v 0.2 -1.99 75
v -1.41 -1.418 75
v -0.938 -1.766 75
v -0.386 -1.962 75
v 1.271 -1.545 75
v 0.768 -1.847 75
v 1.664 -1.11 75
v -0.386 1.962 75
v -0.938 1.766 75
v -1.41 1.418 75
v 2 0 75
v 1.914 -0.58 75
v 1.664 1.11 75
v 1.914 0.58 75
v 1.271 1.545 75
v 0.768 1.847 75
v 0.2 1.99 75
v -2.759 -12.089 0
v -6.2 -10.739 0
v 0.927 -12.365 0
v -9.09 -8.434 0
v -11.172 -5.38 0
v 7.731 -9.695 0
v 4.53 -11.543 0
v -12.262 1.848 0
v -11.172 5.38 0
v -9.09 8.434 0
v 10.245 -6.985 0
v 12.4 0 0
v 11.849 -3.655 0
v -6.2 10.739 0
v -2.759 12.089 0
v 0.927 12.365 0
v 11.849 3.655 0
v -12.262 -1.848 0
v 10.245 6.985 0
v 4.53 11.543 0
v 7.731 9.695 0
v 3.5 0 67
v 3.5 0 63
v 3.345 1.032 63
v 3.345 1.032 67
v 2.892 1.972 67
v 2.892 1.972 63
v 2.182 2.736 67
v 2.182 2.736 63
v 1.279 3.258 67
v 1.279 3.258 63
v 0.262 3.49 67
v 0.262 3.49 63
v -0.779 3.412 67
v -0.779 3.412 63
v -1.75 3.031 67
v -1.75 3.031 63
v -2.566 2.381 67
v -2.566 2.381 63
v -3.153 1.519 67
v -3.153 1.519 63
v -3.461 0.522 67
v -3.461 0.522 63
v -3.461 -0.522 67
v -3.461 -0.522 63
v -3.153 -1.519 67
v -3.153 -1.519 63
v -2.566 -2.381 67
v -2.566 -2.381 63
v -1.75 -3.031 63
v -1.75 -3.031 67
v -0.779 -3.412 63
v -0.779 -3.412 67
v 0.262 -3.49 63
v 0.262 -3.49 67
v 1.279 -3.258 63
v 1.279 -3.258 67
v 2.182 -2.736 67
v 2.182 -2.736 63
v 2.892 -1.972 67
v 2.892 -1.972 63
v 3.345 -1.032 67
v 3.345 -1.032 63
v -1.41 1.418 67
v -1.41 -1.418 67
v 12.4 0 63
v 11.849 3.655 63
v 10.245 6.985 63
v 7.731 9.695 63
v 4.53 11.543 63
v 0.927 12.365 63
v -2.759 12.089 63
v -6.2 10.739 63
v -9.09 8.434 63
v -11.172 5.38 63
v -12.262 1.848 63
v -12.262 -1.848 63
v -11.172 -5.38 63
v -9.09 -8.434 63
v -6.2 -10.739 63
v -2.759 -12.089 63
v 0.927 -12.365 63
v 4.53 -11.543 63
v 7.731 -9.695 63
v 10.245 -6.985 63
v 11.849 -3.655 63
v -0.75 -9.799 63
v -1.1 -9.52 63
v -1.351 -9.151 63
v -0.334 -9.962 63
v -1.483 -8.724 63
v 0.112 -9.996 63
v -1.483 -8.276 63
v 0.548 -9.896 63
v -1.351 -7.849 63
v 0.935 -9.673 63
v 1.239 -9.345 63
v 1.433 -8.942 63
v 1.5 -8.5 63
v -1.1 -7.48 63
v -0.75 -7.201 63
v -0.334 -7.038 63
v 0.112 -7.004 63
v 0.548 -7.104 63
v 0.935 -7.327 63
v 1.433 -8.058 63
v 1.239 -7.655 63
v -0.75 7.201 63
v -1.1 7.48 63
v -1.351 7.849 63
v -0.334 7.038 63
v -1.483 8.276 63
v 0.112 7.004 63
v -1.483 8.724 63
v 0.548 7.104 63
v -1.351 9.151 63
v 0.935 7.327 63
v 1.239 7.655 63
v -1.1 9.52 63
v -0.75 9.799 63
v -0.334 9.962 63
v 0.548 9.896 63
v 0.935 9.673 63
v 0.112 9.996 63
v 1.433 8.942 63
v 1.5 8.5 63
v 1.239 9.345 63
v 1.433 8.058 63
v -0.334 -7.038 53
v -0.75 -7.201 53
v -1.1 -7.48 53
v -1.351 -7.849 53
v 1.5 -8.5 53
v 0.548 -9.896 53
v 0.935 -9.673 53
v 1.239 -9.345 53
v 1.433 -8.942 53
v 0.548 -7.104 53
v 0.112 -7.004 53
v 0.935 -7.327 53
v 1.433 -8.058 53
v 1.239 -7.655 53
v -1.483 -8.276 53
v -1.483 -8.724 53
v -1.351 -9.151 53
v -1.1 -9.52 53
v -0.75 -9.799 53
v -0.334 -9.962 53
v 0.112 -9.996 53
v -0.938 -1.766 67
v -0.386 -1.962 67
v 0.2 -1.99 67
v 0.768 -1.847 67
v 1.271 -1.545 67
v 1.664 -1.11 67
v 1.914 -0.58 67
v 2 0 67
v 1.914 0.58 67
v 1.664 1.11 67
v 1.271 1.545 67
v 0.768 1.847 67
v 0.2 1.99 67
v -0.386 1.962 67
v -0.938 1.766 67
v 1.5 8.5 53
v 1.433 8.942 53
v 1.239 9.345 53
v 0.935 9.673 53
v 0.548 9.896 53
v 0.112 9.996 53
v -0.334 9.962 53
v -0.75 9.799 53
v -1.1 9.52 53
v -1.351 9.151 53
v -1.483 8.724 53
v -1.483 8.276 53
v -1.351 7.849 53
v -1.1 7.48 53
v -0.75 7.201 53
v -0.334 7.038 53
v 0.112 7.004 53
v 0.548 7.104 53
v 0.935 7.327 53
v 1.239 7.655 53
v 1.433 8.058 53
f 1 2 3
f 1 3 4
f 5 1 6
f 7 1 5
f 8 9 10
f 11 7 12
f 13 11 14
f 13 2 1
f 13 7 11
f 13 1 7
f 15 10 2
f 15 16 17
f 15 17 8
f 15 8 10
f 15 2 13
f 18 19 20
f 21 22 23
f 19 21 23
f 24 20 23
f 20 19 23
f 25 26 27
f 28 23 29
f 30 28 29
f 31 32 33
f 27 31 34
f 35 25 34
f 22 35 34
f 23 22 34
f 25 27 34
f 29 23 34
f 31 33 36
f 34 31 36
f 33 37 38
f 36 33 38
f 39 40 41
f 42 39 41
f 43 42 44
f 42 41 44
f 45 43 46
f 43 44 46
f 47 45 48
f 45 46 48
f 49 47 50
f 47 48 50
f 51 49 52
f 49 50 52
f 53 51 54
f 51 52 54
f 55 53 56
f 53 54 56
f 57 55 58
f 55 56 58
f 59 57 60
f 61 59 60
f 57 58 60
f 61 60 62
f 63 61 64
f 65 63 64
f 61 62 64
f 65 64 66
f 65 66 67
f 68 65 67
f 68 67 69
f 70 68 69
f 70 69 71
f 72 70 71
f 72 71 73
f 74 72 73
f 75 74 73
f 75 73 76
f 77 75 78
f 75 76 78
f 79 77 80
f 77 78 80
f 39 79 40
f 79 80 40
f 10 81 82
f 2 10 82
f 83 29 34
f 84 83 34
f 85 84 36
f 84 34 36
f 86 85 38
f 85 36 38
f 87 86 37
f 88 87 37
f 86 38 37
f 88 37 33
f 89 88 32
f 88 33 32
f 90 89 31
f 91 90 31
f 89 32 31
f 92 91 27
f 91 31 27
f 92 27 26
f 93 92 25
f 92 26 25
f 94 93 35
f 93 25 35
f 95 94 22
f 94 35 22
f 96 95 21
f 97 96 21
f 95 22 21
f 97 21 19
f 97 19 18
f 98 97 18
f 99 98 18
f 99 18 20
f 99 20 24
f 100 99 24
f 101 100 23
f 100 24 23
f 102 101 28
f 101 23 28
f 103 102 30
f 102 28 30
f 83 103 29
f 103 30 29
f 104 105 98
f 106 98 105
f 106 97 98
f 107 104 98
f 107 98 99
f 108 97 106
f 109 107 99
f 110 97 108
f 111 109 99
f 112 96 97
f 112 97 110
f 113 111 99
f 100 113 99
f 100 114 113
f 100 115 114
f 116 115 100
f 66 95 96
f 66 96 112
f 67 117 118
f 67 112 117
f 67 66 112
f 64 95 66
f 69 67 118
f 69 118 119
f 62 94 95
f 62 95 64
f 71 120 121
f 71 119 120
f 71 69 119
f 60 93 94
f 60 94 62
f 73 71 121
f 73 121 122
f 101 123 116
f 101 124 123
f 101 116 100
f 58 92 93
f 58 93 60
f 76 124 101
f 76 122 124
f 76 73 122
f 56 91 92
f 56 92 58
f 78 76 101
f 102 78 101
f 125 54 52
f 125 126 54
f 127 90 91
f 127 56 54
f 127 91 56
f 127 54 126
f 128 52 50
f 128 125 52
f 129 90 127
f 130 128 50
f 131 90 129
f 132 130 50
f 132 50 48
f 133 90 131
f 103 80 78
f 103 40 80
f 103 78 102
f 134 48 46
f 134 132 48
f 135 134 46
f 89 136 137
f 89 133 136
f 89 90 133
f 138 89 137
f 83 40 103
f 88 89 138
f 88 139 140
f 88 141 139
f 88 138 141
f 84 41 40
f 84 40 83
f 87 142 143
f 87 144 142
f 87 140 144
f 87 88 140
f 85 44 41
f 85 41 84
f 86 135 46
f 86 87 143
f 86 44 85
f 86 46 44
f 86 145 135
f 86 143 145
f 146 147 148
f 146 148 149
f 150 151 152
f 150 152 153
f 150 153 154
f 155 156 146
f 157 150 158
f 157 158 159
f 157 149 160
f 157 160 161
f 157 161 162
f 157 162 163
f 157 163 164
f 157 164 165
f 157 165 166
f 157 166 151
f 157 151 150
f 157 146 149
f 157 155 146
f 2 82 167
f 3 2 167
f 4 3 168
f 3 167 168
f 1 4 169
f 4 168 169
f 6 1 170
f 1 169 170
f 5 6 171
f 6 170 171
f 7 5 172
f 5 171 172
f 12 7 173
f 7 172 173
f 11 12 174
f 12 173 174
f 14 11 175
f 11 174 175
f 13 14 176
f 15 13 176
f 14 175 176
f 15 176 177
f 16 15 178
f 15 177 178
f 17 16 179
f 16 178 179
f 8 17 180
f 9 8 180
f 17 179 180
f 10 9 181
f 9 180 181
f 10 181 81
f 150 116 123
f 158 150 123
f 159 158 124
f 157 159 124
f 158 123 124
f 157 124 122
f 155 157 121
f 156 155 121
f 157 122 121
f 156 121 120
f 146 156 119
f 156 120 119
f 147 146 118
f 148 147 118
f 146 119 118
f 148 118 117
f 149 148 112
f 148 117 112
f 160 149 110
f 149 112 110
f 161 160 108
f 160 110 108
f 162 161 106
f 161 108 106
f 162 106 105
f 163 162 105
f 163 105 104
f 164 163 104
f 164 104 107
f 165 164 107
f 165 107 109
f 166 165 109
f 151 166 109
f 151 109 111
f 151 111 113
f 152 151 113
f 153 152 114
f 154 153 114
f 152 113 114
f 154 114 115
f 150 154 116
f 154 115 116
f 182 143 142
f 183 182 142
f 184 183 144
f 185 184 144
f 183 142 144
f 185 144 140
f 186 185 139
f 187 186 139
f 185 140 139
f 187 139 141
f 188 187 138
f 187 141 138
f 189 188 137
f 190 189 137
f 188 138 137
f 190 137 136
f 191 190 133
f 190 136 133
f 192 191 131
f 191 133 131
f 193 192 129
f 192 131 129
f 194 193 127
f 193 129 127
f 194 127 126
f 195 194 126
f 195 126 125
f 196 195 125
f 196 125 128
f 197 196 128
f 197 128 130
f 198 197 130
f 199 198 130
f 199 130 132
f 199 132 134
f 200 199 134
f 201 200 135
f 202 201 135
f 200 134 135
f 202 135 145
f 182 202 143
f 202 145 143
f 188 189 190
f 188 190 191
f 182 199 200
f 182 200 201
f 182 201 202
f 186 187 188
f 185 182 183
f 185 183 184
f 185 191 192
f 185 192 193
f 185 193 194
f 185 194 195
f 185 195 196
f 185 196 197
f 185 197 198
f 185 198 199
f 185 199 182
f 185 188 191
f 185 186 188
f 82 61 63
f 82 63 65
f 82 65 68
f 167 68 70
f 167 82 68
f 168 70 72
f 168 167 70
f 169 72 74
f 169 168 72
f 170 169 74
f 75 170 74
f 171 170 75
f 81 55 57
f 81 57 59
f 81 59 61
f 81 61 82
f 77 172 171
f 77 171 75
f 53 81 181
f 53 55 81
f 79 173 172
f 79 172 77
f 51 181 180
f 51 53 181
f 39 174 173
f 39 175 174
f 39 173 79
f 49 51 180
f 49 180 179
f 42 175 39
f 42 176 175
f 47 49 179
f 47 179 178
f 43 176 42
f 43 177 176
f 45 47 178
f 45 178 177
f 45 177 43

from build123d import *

# Parameters (mm, degrees)
SKETCH_1_R          = 12.4
EXTRUDE_1_DEPTH     = 63
SKETCH_2_R          = 3.5
EXTRUDE_2_DEPTH     = 4
EXTRUDE_3_DEPTH     = 8
SKETCH_4_R          = 1.5
CUT_EXTRUDE_1_DEPTH = 10


with BuildPart() as part:
    # 草图1 → 凸台-拉伸1 (new body)
    with BuildSketch(Plane.XY):
        Circle(SKETCH_1_R)
    extrude(amount=EXTRUDE_1_DEPTH)

    # 草图2 → 凸台-拉伸2 (add)
    with BuildSketch(Plane.XY.offset(63)):
        Circle(SKETCH_2_R)
    extrude(amount=EXTRUDE_2_DEPTH)

    # 草图3 → 凸台-拉伸3 (add)
    with BuildSketch(Plane.XY.offset(67)):
        with BuildLine():
            Line((-1.41, 1.418414608), (-1.41, -1.418414608))
            ThreePointArc((-1.41, -1.418414608), (2, 0), (-1.41, 1.418414608))
        make_face()
    extrude(amount=EXTRUDE_3_DEPTH)

    # 草图4 → 切除-拉伸1 (cut)
    with BuildSketch(Plane.XY.offset(63)):
        with Locations((0, -8.5)):
            Circle(SKETCH_4_R)
        with Locations((0, 8.5)):
            Circle(SKETCH_4_R)
    extrude(amount=-CUT_EXTRUDE_1_DEPTH, mode=Mode.SUBTRACT)


solid = part.part
